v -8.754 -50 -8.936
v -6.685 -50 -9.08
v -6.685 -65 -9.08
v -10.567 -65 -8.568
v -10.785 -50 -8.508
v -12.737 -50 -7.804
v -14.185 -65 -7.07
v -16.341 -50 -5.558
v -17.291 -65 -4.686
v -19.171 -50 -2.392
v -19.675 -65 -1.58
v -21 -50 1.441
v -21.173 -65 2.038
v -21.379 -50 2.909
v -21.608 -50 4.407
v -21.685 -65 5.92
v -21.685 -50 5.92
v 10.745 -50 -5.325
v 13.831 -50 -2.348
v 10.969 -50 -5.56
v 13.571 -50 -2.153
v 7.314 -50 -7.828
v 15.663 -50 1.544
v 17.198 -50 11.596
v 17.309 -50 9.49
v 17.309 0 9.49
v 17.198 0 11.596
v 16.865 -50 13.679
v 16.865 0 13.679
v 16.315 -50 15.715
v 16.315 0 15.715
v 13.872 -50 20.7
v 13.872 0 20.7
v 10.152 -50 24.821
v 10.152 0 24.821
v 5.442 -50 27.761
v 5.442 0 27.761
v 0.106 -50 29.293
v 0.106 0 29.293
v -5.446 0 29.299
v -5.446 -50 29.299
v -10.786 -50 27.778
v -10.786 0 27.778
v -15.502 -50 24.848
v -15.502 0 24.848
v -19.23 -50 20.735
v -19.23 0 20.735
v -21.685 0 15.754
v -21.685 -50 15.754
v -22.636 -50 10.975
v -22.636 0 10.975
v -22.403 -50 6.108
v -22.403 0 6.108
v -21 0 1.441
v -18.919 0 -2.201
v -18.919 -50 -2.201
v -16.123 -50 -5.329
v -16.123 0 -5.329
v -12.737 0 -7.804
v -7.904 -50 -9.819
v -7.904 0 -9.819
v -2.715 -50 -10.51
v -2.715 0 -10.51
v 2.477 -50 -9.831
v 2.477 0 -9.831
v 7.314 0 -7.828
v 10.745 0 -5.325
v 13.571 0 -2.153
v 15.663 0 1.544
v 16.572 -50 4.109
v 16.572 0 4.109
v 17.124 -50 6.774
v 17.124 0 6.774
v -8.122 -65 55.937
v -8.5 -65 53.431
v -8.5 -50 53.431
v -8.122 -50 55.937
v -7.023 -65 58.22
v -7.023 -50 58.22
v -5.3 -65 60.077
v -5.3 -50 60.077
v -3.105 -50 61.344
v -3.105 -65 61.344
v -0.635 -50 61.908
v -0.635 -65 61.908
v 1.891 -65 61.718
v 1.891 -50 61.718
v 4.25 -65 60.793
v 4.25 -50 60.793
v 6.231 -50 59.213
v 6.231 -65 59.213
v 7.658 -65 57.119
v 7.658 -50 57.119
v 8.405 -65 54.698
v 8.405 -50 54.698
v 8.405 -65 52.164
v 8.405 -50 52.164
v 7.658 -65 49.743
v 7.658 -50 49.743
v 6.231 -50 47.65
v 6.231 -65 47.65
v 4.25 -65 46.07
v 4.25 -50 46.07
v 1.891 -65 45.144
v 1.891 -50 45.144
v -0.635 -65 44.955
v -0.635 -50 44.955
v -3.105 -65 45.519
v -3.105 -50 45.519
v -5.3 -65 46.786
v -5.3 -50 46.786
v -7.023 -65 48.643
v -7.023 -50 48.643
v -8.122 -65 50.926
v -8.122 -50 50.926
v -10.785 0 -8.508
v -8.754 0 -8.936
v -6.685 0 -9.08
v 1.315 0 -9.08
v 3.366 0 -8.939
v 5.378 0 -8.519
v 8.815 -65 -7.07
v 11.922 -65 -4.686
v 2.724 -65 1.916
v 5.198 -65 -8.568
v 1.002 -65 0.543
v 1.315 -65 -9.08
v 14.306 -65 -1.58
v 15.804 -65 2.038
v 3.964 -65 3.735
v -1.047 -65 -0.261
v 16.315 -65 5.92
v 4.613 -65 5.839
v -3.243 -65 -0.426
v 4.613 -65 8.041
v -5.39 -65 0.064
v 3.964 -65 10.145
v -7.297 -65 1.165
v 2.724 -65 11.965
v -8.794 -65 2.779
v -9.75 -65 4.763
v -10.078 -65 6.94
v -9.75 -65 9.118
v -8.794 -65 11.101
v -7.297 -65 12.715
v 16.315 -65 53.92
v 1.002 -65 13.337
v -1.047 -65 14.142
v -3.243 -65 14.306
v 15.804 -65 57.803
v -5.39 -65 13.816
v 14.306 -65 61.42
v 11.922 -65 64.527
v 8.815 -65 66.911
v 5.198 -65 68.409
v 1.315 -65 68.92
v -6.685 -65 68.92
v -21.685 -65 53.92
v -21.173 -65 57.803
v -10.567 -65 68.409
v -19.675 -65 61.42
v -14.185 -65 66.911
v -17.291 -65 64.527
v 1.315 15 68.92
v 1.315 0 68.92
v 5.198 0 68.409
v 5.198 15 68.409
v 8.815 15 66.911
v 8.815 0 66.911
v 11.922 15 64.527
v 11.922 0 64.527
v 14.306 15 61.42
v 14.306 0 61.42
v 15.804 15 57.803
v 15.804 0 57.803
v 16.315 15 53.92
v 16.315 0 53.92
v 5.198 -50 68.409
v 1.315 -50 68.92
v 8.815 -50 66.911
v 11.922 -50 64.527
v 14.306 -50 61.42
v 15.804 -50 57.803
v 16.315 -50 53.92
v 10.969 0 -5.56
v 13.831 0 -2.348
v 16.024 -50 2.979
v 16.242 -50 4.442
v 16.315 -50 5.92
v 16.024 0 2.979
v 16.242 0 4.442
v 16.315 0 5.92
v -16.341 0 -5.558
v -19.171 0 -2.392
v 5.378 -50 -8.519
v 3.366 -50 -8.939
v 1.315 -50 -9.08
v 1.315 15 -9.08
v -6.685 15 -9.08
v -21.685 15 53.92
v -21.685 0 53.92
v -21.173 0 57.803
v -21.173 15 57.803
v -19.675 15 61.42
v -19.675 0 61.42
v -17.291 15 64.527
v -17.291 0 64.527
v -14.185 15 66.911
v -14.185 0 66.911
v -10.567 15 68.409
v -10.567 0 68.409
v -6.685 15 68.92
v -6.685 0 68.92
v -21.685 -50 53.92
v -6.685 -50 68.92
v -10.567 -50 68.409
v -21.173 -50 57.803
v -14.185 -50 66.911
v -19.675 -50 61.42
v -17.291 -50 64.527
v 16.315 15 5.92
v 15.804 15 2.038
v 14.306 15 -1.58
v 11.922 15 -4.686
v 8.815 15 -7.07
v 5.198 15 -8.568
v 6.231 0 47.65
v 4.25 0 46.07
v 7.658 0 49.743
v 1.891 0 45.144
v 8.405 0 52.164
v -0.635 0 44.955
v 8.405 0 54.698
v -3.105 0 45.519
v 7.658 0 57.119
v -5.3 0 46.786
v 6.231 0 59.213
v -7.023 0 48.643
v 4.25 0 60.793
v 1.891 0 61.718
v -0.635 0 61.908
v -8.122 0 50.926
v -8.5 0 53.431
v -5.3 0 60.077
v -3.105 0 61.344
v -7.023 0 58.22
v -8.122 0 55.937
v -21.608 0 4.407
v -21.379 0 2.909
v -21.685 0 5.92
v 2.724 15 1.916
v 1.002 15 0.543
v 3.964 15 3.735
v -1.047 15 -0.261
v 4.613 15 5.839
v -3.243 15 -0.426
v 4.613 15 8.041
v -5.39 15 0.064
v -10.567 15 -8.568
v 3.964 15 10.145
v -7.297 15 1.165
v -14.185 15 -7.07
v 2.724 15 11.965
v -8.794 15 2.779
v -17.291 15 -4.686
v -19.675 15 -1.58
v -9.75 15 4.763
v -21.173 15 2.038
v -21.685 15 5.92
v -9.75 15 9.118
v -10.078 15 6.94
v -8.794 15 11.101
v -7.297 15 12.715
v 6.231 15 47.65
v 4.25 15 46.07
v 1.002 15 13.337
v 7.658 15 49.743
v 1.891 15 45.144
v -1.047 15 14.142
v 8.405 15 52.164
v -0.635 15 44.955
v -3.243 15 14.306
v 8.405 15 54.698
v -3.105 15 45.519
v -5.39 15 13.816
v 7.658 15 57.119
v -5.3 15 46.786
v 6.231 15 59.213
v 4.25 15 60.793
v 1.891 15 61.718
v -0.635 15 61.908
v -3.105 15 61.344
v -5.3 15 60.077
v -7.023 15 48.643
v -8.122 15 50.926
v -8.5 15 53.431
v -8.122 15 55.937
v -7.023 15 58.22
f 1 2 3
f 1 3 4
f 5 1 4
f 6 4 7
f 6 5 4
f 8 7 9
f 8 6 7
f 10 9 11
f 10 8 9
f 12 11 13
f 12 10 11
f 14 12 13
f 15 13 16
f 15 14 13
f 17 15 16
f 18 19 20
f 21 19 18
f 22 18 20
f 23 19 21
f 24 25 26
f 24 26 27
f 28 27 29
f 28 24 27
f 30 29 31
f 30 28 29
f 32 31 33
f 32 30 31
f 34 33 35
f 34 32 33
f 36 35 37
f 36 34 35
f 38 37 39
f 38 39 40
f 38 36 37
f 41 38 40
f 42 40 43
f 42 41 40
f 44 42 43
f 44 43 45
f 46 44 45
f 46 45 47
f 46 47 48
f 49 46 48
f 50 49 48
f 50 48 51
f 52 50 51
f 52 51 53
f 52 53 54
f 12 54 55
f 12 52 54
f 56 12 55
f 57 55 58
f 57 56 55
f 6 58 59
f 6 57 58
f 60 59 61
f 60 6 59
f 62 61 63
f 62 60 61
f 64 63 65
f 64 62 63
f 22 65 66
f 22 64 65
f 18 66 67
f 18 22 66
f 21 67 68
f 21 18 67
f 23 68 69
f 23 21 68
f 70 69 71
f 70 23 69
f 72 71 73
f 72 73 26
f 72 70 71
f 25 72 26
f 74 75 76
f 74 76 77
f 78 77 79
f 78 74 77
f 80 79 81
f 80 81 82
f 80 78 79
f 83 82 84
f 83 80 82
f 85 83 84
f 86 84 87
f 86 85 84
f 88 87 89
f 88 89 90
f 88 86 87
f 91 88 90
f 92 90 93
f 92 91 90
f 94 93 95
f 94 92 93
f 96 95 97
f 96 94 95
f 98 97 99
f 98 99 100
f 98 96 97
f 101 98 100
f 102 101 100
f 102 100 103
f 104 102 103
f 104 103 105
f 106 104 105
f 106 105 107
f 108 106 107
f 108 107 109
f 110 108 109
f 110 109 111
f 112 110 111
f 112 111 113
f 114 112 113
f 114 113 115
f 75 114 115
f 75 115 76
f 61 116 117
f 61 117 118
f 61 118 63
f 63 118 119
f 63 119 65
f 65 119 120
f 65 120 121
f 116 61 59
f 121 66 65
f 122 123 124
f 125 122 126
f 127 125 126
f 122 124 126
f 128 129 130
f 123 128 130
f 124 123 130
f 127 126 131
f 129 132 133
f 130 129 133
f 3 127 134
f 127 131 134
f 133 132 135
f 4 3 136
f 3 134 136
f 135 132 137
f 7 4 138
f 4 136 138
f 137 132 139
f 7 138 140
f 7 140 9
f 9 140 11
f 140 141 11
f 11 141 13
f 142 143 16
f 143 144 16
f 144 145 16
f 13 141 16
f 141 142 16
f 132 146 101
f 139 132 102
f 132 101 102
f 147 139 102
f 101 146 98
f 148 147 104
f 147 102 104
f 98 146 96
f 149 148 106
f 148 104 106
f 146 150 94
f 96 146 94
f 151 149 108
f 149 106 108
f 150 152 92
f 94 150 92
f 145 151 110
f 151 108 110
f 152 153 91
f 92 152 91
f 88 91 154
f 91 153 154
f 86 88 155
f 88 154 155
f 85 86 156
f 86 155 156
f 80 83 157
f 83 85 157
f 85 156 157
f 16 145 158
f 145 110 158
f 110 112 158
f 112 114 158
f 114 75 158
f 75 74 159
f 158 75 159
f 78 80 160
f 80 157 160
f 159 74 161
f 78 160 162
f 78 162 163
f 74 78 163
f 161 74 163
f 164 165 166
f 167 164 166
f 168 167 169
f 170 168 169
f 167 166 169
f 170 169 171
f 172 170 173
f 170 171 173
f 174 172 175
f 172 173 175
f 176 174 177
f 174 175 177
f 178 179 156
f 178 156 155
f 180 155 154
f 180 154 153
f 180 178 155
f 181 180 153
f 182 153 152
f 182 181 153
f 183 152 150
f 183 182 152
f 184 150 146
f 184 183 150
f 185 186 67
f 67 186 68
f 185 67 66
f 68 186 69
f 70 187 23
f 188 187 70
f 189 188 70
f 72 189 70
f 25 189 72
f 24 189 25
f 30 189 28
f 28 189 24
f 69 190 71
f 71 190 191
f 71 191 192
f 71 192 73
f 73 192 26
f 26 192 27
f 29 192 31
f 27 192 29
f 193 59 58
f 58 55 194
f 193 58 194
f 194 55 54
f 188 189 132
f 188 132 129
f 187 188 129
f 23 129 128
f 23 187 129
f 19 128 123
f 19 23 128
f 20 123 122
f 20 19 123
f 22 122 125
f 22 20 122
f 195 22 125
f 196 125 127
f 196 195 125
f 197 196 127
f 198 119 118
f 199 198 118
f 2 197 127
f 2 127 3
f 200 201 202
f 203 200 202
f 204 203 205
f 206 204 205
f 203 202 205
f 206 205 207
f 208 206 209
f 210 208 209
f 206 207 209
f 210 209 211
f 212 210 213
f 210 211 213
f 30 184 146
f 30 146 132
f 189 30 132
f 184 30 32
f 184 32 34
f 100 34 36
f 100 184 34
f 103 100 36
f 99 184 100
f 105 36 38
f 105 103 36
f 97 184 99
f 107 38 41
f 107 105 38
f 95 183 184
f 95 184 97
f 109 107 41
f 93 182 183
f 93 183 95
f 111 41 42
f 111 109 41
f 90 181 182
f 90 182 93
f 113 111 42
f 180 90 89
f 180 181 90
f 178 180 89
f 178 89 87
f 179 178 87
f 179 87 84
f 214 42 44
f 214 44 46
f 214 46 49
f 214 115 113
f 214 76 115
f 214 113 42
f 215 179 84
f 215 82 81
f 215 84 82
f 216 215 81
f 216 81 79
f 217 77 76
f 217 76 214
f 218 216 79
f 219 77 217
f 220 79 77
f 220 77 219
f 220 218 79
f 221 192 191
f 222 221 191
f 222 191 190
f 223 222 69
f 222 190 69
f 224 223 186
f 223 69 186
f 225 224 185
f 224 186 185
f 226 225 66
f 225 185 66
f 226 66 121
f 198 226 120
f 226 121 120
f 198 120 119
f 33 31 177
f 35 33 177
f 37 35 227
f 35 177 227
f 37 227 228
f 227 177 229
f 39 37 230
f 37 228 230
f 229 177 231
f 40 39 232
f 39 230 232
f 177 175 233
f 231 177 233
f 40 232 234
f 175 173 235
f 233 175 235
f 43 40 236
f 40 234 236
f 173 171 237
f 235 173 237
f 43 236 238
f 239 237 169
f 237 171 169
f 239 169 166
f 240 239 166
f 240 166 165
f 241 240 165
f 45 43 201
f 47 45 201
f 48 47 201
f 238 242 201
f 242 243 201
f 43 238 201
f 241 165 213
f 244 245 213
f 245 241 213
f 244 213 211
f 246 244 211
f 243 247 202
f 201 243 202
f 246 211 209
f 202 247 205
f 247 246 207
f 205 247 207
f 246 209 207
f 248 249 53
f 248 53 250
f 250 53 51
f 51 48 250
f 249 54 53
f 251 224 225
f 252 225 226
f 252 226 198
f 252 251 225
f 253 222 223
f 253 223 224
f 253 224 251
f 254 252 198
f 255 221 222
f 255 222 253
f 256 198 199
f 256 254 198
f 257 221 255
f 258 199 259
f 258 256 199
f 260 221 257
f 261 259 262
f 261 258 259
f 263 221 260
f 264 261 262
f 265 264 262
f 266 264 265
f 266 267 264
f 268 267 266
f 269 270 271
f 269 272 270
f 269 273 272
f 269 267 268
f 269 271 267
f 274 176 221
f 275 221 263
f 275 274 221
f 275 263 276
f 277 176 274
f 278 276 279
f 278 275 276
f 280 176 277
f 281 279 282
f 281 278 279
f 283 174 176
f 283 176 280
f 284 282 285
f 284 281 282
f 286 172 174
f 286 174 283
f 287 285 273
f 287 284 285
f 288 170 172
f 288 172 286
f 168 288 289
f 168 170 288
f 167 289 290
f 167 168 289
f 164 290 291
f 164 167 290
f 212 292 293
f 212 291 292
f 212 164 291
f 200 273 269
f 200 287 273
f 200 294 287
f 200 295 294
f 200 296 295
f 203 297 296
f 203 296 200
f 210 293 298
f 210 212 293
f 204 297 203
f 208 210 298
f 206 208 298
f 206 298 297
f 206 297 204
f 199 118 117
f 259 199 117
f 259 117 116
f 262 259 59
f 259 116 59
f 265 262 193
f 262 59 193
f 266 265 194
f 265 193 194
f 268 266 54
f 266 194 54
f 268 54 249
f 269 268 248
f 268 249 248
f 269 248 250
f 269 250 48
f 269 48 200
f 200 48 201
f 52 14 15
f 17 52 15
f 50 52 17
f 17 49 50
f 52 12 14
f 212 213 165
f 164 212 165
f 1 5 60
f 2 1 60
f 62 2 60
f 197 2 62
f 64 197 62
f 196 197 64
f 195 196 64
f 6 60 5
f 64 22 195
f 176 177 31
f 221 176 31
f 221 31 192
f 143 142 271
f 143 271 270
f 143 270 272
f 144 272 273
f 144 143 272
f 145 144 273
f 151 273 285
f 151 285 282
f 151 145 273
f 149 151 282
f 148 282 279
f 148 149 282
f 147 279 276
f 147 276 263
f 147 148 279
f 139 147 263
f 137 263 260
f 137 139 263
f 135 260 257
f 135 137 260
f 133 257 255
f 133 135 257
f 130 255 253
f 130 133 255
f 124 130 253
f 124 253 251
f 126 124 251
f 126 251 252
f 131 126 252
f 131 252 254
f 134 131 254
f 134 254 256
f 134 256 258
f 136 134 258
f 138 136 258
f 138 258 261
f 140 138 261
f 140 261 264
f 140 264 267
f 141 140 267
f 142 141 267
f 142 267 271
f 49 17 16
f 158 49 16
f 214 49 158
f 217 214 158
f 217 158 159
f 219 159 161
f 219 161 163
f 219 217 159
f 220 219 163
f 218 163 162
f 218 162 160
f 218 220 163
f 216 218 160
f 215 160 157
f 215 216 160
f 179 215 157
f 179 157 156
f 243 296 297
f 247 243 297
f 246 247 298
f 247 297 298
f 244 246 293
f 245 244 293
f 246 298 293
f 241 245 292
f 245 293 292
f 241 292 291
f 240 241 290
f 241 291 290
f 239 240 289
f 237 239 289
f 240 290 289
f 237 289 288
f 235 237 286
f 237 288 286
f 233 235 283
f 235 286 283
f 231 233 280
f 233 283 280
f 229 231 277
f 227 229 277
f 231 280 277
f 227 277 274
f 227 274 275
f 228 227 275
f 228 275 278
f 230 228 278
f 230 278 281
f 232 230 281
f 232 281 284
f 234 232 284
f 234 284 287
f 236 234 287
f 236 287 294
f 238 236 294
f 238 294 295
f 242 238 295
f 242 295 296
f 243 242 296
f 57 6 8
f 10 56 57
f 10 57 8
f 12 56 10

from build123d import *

# Parameters (mm, degrees)
F0_R     = 20
F1_DEPTH = 25
F3_DEPTH = 15
F4_R     = 7.386866
F5_DEPTH = 125
F6_R     = 8.5
F7_DEPTH = 25


with BuildPart() as f1:
    # F0 (on Front) → F1 (new body)
    with BuildSketch(Plane.XZ):
        with Locations((-2.691098, 9.489658)):
            Circle(F0_R)
    extrude(amount=F1_DEPTH)

    # F2 (on face) → F3 (join)
    with BuildSketch(Plane(origin=(0, 0, 0), x_dir=(-1, 0, 0), z_dir=(0, 1, 0))):
        with BuildLine():
            ThreePointArc((-16.315418, 5.920409), (-11.92202, -4.686193), (-1.315418, -9.079591))
            Line((-1.315418, -9.079591), (6.684582, -9.079591))
            ThreePointArc((6.684582, -9.079591), (17.291184, -4.686193), (21.684582, 5.920409))
            Line((21.684582, 5.920409), (21.684582, 53.920409))
            ThreePointArc((21.684582, 53.920409), (17.291184, 64.527011), (6.684582, 68.920409))
            Line((6.684582, 68.920409), (-1.315418, 68.920409))
            ThreePointArc((-1.315418, 68.920409), (-11.92202, 64.527011), (-16.315418, 53.920409))
            Line((-16.315418, 53.920409), (-16.315418, 5.920409))
        make_face()
    extrude(amount=F3_DEPTH)

    # F4 (on face) → F5 (cut)
    with BuildSketch(Plane(origin=(0, 15, 0), x_dir=(-1, 0, 0), z_dir=(0, 1, 0))):
        with Locations((2.691099, 6.940198)):
            Circle(F4_R)
    extrude(amount=-F5_DEPTH, mode=Mode.SUBTRACT)

    # F6 (on face) → F7 (cut)
    with BuildSketch(Plane(origin=(0, 15, 0), x_dir=(-1, 0, 0), z_dir=(0, 1, 0))):
        with Locations((0, 53.43134)):
            Circle(F6_R)
    extrude(amount=-F7_DEPTH, mode=Mode.SUBTRACT)

    # F8: F1 across face


with BuildPart() as f1_1:
    add(f1.part)
    add(f1.part.mirror(Plane(origin=(-2.691098, -25, 9.892378), x_dir=(1, 0, 0), z_dir=(0, -1, 0))))


solid = f1_1.part
